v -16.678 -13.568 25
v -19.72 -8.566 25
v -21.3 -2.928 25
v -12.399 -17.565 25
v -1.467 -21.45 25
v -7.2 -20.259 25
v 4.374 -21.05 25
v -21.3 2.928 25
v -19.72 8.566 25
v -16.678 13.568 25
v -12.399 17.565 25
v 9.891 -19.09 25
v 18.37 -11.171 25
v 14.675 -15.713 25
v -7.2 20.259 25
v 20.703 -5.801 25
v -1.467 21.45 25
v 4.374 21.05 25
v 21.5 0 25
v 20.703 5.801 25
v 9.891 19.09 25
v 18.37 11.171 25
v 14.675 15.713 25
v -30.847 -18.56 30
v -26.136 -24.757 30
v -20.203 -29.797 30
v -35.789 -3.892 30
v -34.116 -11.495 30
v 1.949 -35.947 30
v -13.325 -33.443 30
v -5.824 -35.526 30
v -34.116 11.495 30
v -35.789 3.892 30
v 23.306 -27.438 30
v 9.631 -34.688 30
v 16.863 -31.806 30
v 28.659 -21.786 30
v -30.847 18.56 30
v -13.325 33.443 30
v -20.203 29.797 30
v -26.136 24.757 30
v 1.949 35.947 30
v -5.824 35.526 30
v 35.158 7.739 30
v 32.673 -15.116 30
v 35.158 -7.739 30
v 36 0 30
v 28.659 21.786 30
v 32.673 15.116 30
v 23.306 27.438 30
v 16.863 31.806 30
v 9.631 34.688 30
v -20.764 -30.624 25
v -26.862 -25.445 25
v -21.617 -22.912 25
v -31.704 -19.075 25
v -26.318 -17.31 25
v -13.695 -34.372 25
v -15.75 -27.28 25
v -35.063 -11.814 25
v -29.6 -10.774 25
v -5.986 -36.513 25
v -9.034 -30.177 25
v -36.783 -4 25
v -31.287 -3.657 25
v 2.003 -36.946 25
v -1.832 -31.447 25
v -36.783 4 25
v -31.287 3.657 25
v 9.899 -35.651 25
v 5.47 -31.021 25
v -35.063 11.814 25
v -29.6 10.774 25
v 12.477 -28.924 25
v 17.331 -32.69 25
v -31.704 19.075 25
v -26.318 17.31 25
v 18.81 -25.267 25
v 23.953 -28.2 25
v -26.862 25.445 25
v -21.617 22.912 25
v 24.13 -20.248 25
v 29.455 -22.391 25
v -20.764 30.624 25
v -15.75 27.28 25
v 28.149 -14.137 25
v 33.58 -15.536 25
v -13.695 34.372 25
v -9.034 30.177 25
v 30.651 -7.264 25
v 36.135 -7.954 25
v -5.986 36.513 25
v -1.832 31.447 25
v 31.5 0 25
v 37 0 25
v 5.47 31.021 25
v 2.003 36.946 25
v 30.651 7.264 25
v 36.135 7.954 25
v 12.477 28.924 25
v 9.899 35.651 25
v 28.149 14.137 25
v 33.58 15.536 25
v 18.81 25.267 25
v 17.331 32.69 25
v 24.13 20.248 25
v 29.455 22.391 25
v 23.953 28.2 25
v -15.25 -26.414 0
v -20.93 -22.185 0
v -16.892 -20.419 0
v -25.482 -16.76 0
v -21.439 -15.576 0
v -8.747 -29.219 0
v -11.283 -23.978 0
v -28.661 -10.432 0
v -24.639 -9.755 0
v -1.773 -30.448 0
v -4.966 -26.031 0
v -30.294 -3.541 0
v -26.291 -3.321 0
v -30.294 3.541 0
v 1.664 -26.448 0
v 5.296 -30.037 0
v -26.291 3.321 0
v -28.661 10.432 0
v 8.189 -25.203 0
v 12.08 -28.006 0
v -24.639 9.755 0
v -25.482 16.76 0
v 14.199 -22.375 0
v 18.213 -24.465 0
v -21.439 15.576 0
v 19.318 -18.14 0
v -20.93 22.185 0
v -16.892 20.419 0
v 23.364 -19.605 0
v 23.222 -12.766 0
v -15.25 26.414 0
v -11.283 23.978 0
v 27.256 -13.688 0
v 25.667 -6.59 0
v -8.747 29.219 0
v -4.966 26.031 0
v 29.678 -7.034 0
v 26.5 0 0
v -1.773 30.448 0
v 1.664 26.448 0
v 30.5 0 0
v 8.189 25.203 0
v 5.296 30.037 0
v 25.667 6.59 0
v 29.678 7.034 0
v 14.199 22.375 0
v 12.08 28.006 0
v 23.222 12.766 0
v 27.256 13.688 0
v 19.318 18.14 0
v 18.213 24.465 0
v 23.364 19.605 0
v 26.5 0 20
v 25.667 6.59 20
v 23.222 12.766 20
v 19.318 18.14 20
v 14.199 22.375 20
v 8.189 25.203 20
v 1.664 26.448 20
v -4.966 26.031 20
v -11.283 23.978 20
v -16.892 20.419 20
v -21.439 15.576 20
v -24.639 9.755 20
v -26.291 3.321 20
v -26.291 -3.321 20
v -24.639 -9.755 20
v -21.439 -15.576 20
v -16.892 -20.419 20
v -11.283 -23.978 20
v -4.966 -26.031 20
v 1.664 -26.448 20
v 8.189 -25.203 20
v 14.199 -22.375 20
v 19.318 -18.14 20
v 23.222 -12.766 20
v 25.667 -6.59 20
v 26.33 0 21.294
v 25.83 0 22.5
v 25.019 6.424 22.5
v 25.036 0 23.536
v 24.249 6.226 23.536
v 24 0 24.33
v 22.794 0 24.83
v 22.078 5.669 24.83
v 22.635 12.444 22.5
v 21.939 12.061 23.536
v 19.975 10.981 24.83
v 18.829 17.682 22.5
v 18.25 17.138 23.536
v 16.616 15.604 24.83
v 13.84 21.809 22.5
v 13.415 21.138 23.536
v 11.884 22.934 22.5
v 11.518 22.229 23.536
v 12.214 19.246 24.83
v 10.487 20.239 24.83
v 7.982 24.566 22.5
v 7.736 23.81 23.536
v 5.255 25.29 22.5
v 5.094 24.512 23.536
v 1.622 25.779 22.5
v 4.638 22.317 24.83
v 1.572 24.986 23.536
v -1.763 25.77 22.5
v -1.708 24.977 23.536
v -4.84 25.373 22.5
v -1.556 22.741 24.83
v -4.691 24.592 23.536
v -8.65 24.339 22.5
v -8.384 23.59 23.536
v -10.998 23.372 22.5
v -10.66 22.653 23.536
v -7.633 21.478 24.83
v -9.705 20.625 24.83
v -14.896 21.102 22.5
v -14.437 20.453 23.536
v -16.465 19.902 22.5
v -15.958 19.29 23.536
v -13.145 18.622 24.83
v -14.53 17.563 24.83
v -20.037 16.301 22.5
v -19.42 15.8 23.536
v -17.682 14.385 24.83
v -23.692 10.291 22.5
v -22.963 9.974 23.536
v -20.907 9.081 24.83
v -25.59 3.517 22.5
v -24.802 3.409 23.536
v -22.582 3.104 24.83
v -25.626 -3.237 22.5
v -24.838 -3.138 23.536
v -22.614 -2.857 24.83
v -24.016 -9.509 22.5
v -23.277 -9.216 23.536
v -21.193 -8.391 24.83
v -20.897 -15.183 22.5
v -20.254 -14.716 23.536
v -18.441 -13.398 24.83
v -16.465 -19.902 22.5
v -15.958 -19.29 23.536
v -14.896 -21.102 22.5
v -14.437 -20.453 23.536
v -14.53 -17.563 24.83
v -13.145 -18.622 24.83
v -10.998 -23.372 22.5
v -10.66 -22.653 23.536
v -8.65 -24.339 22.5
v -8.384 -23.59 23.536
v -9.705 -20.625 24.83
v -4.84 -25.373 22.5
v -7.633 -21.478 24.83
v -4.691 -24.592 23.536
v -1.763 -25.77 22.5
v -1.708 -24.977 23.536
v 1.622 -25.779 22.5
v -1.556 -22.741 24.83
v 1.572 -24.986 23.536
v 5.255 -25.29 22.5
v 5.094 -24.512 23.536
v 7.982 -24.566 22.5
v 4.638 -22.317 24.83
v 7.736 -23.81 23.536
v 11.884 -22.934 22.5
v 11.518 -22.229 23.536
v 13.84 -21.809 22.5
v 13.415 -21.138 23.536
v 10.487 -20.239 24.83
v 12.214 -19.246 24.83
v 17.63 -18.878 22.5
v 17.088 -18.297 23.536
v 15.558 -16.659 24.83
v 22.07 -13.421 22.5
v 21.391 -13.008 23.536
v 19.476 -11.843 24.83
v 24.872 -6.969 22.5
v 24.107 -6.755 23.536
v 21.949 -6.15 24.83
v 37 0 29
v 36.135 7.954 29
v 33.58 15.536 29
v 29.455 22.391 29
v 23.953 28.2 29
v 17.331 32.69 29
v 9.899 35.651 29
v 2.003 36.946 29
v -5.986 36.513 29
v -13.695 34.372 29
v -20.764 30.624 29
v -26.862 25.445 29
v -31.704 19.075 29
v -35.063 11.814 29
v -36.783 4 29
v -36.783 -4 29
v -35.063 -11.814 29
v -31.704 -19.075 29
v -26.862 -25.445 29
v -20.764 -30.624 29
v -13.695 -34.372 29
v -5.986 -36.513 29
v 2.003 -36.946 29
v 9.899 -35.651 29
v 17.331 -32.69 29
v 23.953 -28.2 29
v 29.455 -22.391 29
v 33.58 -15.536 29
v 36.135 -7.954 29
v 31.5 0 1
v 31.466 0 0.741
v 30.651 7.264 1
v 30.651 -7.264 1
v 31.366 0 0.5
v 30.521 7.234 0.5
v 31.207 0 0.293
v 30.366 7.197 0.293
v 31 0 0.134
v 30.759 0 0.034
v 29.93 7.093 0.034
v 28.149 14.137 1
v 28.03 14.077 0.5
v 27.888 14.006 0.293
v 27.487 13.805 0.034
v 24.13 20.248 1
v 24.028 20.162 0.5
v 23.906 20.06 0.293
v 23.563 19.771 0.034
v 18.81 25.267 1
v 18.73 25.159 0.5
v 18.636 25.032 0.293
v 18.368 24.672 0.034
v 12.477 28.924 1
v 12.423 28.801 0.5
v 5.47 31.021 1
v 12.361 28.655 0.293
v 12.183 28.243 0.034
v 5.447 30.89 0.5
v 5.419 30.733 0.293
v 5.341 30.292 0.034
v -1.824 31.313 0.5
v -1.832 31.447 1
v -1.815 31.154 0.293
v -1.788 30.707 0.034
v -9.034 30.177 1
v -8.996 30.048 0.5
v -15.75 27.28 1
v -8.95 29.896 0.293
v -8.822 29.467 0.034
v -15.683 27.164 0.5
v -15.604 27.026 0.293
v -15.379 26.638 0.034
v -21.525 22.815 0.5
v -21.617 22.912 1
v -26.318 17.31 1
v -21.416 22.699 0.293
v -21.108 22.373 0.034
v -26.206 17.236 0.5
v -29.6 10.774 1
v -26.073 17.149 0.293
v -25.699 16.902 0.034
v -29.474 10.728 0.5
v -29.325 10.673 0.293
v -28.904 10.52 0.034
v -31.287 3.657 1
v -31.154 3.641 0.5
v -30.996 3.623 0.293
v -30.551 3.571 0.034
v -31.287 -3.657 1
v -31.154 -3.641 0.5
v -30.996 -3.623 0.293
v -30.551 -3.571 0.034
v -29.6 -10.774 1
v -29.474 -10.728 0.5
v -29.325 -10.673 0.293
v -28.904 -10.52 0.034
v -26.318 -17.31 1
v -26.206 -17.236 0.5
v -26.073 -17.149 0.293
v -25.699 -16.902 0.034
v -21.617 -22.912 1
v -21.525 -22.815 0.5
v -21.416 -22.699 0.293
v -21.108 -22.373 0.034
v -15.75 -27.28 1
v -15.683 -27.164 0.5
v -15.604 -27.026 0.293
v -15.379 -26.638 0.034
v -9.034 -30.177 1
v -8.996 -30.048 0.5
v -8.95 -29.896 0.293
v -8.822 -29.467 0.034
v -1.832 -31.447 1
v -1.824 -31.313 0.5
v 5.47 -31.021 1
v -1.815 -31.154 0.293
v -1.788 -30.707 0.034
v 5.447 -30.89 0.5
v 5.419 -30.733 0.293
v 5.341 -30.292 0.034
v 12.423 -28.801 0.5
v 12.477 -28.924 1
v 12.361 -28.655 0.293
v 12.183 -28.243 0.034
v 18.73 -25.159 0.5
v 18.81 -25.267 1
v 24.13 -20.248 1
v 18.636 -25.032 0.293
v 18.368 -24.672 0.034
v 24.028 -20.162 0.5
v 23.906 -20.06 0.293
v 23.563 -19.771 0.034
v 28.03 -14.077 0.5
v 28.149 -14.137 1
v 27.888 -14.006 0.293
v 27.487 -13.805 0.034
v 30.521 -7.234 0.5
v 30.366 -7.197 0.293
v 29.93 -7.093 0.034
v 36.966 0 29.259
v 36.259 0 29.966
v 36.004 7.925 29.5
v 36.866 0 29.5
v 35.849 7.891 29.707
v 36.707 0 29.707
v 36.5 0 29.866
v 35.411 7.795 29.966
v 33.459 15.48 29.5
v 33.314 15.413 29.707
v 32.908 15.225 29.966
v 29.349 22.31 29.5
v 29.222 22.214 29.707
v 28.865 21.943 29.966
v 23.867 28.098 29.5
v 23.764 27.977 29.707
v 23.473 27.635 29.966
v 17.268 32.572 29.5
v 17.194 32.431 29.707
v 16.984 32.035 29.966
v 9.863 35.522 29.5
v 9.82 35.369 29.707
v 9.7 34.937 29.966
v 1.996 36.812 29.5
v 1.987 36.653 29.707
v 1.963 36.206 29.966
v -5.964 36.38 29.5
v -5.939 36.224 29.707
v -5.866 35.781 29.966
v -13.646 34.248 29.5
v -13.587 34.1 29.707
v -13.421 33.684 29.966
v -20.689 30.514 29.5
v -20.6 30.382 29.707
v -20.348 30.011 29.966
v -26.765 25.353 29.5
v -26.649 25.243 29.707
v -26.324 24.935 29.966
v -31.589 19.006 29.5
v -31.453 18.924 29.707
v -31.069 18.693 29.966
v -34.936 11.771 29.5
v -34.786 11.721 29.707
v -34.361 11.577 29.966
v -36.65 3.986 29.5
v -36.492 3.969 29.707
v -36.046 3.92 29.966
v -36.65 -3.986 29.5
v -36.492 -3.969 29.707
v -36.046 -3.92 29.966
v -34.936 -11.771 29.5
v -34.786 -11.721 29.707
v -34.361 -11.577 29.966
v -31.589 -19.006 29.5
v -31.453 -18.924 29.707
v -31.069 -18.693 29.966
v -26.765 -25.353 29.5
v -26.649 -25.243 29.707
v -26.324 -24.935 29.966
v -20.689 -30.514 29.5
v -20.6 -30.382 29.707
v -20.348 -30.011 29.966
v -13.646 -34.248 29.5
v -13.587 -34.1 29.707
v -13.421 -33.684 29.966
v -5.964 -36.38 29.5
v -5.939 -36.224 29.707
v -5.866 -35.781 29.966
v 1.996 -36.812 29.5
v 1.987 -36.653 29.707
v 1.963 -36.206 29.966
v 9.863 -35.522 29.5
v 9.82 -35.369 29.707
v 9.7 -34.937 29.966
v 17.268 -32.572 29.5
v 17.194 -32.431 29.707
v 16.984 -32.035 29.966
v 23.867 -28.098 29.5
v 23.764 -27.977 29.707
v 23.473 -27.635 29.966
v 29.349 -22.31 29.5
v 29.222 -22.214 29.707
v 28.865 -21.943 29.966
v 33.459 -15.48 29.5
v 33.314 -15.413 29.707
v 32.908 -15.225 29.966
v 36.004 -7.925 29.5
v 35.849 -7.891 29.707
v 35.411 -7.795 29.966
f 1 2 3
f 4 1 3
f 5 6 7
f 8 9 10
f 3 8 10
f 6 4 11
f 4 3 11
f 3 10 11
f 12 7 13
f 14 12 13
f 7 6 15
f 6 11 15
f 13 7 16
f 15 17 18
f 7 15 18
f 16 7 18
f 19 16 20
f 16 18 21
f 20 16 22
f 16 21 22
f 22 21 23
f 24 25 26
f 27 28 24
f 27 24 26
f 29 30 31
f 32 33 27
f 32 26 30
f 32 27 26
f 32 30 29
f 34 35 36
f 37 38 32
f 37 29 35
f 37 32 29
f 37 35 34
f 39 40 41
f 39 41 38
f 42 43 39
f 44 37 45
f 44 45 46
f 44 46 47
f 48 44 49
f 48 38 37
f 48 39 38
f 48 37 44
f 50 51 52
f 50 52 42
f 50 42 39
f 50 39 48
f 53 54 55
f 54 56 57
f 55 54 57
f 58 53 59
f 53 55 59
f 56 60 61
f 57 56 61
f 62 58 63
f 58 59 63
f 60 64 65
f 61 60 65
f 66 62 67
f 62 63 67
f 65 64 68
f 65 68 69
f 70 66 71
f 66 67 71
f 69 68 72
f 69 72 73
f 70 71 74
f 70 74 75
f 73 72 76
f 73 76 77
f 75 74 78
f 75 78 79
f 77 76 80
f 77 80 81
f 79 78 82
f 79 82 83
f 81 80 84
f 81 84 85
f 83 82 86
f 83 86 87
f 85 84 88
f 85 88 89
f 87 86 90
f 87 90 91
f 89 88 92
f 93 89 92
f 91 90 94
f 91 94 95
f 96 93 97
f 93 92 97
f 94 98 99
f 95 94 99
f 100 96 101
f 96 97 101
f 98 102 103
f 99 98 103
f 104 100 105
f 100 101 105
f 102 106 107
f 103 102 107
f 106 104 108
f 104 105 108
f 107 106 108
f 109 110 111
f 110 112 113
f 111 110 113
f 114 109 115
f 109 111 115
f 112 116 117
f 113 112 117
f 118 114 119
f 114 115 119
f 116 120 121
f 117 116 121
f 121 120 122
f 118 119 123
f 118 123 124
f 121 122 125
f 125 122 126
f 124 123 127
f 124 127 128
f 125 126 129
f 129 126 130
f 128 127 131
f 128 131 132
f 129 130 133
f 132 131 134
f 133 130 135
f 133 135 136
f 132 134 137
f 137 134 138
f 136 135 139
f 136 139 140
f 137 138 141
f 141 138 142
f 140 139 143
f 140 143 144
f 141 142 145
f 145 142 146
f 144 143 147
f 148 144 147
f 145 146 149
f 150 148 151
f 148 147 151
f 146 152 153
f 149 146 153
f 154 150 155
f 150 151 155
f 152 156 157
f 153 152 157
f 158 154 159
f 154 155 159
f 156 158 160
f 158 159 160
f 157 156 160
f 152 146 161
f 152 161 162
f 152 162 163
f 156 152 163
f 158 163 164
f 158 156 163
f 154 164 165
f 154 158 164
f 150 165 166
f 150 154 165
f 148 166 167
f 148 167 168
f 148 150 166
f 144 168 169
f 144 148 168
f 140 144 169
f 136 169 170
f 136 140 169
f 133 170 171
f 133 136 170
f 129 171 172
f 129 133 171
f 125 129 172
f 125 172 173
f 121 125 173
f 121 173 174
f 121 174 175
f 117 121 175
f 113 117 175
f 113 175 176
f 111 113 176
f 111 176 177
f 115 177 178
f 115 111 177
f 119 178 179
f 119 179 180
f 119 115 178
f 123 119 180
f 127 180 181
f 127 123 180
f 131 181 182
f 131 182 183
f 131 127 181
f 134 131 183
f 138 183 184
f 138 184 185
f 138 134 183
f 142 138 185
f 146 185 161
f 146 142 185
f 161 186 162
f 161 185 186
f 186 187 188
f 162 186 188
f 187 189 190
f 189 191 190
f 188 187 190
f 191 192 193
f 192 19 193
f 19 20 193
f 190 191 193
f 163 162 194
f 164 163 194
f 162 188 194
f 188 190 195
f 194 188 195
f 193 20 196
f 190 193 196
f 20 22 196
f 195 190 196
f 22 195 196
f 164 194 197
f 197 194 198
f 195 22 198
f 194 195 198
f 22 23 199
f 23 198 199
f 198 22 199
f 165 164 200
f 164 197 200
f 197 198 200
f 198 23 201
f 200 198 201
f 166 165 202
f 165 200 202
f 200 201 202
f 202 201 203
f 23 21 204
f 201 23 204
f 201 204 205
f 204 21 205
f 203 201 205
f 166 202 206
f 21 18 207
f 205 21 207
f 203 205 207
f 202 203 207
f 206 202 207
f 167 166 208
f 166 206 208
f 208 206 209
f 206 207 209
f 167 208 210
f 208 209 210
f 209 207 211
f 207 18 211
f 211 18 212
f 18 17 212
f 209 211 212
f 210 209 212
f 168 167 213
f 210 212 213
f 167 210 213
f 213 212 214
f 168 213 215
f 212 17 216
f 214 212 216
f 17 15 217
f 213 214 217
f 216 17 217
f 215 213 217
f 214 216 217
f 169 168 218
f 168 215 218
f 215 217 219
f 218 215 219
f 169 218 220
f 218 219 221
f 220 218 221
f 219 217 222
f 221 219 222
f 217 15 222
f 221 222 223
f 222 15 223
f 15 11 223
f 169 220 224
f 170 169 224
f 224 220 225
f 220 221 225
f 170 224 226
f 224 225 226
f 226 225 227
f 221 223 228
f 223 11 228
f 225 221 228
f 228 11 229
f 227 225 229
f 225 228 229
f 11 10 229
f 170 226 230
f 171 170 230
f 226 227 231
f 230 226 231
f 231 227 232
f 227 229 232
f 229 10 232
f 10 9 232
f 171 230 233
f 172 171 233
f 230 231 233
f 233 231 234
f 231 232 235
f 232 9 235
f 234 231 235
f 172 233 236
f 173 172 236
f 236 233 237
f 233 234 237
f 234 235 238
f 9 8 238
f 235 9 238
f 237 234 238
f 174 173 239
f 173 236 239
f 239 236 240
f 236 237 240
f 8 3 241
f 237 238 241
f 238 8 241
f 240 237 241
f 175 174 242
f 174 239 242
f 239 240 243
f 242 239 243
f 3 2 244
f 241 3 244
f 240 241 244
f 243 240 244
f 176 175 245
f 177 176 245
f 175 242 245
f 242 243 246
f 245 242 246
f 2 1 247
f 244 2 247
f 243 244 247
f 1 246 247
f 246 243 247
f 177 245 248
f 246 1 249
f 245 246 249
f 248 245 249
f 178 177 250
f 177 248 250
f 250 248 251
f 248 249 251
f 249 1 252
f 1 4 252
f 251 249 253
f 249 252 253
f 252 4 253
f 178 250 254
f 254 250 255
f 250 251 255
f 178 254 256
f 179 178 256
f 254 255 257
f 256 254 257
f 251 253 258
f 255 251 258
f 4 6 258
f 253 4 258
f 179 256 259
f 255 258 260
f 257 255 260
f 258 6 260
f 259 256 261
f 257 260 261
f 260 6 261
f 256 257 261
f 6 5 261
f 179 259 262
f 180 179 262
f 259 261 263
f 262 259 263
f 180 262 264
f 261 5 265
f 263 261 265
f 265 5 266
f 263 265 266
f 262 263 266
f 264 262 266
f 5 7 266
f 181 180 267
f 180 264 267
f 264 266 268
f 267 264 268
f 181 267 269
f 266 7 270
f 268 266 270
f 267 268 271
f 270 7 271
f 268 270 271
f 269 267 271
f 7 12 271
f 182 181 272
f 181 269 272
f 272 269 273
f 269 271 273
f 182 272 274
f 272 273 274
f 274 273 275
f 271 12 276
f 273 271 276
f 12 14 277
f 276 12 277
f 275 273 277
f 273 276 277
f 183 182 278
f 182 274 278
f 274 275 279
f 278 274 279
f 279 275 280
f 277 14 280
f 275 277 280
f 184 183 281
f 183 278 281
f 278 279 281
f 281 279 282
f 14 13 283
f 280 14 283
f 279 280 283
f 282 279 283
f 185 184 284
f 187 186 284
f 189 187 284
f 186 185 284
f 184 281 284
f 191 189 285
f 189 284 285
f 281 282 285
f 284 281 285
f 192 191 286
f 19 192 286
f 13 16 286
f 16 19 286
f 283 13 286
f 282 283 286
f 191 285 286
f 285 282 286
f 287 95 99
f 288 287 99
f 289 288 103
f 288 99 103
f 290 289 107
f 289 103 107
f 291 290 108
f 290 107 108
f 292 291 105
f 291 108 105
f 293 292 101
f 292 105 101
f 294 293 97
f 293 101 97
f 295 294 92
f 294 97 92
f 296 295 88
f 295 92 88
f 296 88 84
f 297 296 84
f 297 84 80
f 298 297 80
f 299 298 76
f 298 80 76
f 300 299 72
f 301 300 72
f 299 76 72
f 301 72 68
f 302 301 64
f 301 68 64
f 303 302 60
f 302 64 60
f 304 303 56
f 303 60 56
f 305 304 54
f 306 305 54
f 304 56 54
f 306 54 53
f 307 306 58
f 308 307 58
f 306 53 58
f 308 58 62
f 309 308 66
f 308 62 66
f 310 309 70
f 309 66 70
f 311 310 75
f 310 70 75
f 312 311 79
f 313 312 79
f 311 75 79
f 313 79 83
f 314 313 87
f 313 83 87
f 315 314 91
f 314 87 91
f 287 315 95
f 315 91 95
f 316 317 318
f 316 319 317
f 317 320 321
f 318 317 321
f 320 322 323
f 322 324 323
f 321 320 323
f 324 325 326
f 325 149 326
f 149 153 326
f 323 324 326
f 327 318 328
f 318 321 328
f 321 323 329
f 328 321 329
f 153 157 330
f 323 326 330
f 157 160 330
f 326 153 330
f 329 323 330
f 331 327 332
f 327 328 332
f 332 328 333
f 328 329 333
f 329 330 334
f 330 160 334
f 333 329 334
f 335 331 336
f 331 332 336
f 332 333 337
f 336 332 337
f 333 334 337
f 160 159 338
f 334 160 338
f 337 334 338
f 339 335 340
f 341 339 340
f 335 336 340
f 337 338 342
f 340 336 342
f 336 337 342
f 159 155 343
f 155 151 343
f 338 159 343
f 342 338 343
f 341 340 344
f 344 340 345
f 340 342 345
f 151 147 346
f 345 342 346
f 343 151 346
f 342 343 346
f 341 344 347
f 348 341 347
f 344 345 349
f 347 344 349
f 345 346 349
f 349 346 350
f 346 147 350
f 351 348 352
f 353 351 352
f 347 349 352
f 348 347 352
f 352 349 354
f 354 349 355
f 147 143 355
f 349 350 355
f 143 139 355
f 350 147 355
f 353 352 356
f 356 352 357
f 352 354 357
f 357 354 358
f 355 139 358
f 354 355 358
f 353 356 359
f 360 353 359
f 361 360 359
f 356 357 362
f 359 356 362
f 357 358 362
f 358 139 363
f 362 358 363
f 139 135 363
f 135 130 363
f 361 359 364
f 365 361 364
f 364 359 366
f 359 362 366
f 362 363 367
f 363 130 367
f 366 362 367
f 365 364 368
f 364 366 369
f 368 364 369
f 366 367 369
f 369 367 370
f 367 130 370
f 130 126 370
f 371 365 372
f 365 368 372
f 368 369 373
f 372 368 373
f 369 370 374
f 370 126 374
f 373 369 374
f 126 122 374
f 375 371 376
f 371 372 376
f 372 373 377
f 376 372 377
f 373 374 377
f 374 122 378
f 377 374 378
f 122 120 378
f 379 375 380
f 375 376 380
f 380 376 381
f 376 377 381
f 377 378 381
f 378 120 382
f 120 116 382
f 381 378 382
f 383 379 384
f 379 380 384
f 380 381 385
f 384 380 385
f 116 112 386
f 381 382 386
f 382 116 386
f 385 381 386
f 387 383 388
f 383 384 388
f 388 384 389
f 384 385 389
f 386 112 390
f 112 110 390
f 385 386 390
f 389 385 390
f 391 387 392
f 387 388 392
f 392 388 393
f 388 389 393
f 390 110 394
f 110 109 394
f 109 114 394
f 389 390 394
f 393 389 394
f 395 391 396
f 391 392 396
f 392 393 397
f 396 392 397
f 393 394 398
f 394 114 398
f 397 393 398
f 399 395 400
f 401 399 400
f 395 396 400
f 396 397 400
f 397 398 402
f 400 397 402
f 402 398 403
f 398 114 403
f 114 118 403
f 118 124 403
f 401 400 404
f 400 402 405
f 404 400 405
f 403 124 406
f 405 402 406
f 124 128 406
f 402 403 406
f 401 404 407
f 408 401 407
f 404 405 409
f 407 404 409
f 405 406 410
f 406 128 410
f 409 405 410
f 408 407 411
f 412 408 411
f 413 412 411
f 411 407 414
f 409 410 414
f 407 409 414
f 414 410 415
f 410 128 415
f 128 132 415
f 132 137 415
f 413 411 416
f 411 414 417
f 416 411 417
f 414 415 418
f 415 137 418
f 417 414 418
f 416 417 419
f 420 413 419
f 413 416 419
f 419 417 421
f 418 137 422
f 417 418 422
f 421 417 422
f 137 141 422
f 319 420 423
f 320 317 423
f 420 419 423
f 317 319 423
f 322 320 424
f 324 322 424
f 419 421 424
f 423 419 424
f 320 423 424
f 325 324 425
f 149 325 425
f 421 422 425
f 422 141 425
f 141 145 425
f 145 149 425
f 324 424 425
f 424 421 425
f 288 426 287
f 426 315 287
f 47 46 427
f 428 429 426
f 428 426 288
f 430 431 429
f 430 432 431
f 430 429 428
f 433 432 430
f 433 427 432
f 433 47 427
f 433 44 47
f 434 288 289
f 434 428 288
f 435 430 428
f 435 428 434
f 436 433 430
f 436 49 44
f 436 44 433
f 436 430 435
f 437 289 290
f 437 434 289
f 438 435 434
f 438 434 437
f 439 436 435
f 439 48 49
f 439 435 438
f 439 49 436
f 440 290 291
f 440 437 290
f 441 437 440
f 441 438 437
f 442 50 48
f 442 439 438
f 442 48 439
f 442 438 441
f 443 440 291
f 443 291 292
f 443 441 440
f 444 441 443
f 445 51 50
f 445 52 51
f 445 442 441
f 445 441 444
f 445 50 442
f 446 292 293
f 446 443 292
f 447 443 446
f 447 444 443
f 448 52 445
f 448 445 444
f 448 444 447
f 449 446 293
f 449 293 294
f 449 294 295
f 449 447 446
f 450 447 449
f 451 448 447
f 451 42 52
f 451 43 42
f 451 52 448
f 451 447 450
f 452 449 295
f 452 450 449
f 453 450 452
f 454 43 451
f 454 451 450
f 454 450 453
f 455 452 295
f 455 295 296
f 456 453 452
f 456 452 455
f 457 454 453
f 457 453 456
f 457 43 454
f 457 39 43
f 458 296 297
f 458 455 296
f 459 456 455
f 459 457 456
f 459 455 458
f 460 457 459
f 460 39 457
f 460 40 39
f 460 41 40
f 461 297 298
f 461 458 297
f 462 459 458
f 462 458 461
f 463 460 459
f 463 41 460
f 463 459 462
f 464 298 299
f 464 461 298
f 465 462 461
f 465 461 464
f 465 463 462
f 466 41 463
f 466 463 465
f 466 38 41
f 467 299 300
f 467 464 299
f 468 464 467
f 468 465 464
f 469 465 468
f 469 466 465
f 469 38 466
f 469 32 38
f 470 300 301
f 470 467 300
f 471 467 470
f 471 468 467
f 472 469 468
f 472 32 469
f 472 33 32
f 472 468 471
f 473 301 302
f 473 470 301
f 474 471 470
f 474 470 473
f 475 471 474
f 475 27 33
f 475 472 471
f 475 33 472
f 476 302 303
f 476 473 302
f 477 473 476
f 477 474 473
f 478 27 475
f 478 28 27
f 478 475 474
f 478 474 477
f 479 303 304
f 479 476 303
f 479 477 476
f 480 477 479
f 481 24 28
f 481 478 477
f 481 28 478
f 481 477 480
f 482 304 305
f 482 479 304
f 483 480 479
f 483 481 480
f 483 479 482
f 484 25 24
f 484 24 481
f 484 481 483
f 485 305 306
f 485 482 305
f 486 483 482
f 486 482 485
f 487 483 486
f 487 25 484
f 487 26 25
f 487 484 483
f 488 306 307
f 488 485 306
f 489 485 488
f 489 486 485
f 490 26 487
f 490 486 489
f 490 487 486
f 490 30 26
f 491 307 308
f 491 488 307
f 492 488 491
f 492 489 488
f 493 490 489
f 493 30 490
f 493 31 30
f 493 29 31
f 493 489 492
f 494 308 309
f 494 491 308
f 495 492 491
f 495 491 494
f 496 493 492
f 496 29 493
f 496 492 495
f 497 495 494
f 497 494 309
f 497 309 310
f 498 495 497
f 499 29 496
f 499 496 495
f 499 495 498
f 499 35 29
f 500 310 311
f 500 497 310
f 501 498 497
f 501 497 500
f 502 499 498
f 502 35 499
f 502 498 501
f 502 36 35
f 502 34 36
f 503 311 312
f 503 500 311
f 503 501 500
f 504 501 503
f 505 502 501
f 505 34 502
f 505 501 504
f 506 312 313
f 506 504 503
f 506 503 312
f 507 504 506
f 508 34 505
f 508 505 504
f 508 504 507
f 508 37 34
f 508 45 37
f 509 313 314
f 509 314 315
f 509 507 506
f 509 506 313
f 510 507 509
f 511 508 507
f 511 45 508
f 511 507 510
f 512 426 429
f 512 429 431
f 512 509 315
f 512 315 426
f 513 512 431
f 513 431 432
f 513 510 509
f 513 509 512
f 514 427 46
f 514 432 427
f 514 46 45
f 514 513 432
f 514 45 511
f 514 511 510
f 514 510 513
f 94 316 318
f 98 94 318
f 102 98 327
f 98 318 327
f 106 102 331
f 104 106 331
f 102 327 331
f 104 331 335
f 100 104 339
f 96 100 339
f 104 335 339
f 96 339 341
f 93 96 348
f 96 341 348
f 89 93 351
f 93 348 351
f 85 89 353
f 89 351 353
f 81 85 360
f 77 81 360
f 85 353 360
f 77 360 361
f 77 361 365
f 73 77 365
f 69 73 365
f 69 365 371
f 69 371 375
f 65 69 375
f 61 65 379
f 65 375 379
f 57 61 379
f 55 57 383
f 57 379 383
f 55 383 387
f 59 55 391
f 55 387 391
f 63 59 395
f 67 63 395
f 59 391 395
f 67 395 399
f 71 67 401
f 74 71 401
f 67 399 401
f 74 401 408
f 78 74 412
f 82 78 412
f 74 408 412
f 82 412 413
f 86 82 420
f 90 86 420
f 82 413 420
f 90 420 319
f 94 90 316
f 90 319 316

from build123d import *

# Parameters (mm, degrees)
F0_R     = 31.5
F0_R_2   = 26.5
F1_DEPTH = 25
F2_R     = 37
F2_R_2   = 31.5
F2_R_3   = 26.5
F3_DEPTH = 5
F4_R     = 1
F5_R     = 1
F6_R     = 5


with BuildPart() as f1:
    # F0 (on Top) → F1 (new body)
    with BuildSketch(Plane.XY):
        Circle(F0_R)
        Circle(F0_R_2, mode=Mode.SUBTRACT)
    extrude(amount=F1_DEPTH)

    # F2 (on face) → F3 (join)
    with BuildSketch(Plane.XY.offset(25)):
        Circle(F2_R)
        Circle(F2_R_2, mode=Mode.SUBTRACT)
        Circle(F2_R_2)
        Circle(F2_R_3, mode=Mode.SUBTRACT)
        Circle(F2_R_3)
    extrude(amount=F3_DEPTH)

    # F4
    f4_edges = [f1.edges().sort_by_distance(p)[0] for p in [
        (-37, 0, 30),
    ]]
    fillet(f4_edges, radius=F4_R)

    # F5
    f5_edges = [f1.edges().sort_by_distance(p)[0] for p in [
        (-31.5, 0, 0),
    ]]
    fillet(f5_edges, radius=F5_R)

    # F6
    f6_edges = [f1.edges().sort_by_distance(p)[0] for p in [
        (-26.5, 0, 25),
    ]]
    fillet(f6_edges, radius=F6_R)


solid = f1.part
